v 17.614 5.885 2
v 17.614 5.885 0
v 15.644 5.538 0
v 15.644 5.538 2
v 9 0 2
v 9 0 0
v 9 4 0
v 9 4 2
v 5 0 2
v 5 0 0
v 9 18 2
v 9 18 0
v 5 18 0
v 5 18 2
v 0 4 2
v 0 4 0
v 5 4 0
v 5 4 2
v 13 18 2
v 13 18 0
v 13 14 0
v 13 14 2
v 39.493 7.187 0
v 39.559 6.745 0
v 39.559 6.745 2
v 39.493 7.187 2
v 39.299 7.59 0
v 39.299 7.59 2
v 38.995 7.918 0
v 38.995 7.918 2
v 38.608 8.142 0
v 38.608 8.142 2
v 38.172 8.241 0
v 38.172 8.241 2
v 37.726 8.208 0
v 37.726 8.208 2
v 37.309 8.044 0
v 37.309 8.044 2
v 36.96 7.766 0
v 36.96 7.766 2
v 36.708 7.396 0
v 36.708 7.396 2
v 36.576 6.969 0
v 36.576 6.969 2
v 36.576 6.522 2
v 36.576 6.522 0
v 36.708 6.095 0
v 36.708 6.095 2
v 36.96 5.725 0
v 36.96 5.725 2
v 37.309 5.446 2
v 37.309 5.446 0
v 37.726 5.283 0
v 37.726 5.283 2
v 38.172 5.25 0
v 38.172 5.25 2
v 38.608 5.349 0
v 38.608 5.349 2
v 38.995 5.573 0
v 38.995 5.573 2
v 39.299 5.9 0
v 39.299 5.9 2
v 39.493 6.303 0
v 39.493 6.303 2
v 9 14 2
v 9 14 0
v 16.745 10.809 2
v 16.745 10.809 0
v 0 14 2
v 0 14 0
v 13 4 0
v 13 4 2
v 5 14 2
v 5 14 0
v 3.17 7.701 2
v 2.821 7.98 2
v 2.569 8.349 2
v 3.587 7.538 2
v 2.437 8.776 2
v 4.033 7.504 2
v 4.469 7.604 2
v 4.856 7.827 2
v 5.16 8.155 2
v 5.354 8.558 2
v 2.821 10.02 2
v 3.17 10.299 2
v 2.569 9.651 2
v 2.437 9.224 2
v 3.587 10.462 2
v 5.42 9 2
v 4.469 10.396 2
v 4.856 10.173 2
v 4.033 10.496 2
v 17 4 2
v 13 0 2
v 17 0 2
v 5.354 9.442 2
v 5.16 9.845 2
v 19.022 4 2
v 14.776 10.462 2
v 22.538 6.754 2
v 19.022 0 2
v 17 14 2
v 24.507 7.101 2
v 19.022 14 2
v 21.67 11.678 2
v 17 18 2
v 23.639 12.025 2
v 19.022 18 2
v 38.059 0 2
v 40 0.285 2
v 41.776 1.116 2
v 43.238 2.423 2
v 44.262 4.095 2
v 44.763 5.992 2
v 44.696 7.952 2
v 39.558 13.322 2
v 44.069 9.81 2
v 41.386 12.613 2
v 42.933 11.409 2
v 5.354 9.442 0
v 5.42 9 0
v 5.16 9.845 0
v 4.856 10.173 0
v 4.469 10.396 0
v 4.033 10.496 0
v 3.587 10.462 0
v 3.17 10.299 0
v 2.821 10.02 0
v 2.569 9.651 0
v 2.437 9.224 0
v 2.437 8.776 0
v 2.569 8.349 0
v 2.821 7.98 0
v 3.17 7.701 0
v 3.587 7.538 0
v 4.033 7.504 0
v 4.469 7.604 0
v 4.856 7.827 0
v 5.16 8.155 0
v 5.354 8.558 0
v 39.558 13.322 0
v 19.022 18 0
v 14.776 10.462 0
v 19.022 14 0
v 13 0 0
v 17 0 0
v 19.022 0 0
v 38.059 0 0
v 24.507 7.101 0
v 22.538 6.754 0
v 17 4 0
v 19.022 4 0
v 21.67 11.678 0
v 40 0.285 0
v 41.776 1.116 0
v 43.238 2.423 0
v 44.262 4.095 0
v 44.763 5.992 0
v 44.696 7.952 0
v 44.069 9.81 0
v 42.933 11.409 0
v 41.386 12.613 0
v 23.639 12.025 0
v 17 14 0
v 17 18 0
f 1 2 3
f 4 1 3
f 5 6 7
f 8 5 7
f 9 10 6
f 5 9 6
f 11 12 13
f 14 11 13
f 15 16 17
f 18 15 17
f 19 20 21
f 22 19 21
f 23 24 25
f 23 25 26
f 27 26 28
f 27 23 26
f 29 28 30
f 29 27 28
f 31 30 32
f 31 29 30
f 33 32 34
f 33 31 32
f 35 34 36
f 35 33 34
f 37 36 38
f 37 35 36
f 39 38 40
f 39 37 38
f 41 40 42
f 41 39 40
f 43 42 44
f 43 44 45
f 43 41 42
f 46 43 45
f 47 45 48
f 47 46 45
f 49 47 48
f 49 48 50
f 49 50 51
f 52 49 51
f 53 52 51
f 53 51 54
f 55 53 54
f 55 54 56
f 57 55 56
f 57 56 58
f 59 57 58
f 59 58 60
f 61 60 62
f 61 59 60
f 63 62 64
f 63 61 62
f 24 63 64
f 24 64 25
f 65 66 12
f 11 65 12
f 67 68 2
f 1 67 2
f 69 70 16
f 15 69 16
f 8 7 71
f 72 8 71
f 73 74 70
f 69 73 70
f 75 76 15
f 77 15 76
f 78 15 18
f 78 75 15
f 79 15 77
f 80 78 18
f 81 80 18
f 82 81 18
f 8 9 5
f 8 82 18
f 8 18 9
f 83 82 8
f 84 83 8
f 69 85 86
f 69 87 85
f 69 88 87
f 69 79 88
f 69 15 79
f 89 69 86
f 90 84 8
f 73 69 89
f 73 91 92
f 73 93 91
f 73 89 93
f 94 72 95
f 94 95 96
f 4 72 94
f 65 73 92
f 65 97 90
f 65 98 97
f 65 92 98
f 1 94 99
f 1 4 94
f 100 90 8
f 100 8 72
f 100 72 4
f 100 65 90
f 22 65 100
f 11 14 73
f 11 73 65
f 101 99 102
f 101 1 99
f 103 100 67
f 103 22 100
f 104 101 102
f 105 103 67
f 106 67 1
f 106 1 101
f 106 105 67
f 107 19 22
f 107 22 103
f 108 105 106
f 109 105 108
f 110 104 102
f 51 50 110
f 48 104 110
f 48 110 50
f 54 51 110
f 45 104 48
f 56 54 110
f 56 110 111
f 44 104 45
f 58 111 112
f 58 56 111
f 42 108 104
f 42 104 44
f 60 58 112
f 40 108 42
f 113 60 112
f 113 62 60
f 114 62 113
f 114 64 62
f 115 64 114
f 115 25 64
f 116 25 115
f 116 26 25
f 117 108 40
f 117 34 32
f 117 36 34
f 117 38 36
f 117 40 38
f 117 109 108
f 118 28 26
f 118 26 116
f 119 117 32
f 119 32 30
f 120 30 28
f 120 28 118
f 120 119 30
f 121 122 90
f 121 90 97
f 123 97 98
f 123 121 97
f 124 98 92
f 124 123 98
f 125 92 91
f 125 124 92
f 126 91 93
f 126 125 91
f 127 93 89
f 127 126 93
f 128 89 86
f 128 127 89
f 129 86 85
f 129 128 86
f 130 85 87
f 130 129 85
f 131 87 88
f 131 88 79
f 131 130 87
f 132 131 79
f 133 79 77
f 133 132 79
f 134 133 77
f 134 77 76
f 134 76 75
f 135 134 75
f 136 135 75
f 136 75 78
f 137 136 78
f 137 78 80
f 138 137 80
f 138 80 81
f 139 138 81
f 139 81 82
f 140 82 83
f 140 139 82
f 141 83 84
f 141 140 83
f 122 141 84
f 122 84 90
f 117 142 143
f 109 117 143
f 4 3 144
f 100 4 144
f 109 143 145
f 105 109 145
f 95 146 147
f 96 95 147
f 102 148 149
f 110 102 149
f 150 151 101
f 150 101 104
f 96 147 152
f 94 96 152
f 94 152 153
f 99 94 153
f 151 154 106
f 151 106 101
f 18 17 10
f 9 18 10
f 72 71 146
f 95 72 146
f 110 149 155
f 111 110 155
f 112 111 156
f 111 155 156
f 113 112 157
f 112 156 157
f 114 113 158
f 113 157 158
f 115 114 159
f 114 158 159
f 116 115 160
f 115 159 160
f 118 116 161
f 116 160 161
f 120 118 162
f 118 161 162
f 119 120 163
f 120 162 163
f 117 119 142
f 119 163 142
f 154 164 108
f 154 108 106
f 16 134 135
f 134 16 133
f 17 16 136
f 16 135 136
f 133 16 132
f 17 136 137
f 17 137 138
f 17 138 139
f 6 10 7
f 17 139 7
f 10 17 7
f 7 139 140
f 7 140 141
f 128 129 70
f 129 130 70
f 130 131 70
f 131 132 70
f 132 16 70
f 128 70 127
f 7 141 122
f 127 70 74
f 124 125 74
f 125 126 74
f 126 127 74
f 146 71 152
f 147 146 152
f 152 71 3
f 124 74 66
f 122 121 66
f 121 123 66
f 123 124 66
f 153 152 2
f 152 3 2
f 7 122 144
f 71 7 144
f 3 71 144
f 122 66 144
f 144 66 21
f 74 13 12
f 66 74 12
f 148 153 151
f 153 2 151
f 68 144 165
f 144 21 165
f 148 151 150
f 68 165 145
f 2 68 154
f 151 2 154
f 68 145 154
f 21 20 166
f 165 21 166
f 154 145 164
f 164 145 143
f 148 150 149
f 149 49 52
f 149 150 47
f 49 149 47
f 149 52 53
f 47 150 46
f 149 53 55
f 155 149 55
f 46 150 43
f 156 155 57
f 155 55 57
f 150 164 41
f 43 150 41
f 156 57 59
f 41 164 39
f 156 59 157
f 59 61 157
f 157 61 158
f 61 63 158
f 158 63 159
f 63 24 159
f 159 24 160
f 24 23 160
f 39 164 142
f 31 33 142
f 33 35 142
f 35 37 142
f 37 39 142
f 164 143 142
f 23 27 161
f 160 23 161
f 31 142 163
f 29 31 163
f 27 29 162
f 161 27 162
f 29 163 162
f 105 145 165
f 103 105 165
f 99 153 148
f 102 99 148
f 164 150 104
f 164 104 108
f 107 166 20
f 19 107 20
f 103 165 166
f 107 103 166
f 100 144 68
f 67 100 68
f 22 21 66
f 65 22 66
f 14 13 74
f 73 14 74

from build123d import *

# Parameters (mm, degrees)
SKETCH1_R           = 1.5
BOSS_EXTRUDE1_DEPTH = 2


with BuildPart() as part:
    # Sketch1 → Boss-Extrude1 (new body)
    with BuildSketch(Plane.XY):
        with BuildLine():
            Line((5, 0), (9, 0))
            Line((9, 0), (9, 4))
            Line((9, 4), (13, 4))
            Line((13, 4), (13, 0))
            Line((13, 0), (17, 0))
            Line((17, 0), (17, 4))
            Line((17, 4), (19.021561934, 4))
            Line((19.021561934, 4), (19.021561934, 0))
            Line((19.021561934, 0), (38.059495851, 0))
            ThreePointArc((38.059495851, 0), (44.762590659, 5.991570372), (39.557599026, 13.322222296))
            Line((39.557599026, 13.322222296), (19.021561934, 17.999988357))
            Line((19.021561934, 17.999988357), (19.021561934, 13.999988357))
            Line((19.021561934, 13.999988357), (17, 13.999988357))
            Line((17, 13.999988357), (17, 17.999988357))
            Line((17, 17.999988357), (13, 17.999988357))
            Line((13, 17.999988357), (13, 13.999988357))
            Line((13, 13.999988357), (9, 13.999988357))
            Line((9, 13.999988357), (9, 17.999988357))
            Line((9, 17.999988357), (5, 17.999988357))
            Line((5, 17.999988357), (5, 13.999988357))
            Line((5, 13.999988357), (0, 13.999988357))
            Line((0, 13.999988357), (0, 4))
            Line((0, 4), (5, 4))
            Line((5, 4), (5, 0))
        make_face()
        with Locations((3.920490093, 9)):
            Circle(SKETCH1_R, mode=Mode.SUBTRACT)
        with Locations((38.059495851, 6.745343083)):
            Circle(SKETCH1_R, mode=Mode.SUBTRACT)
        Polygon((23.639149333, 12.024852982), (21.669533827, 11.677556626), (22.537774715, 6.753517861), (24.507390221, 7.100814216), align=None, mode=Mode.SUBTRACT)
        Polygon((16.745495062, 10.809315738), (17.61373595, 5.885276973), (15.644120444, 5.537980617), (14.775879556, 10.462019383), align=None, mode=Mode.SUBTRACT)
    extrude(amount=BOSS_EXTRUDE1_DEPTH)


solid = part.part
